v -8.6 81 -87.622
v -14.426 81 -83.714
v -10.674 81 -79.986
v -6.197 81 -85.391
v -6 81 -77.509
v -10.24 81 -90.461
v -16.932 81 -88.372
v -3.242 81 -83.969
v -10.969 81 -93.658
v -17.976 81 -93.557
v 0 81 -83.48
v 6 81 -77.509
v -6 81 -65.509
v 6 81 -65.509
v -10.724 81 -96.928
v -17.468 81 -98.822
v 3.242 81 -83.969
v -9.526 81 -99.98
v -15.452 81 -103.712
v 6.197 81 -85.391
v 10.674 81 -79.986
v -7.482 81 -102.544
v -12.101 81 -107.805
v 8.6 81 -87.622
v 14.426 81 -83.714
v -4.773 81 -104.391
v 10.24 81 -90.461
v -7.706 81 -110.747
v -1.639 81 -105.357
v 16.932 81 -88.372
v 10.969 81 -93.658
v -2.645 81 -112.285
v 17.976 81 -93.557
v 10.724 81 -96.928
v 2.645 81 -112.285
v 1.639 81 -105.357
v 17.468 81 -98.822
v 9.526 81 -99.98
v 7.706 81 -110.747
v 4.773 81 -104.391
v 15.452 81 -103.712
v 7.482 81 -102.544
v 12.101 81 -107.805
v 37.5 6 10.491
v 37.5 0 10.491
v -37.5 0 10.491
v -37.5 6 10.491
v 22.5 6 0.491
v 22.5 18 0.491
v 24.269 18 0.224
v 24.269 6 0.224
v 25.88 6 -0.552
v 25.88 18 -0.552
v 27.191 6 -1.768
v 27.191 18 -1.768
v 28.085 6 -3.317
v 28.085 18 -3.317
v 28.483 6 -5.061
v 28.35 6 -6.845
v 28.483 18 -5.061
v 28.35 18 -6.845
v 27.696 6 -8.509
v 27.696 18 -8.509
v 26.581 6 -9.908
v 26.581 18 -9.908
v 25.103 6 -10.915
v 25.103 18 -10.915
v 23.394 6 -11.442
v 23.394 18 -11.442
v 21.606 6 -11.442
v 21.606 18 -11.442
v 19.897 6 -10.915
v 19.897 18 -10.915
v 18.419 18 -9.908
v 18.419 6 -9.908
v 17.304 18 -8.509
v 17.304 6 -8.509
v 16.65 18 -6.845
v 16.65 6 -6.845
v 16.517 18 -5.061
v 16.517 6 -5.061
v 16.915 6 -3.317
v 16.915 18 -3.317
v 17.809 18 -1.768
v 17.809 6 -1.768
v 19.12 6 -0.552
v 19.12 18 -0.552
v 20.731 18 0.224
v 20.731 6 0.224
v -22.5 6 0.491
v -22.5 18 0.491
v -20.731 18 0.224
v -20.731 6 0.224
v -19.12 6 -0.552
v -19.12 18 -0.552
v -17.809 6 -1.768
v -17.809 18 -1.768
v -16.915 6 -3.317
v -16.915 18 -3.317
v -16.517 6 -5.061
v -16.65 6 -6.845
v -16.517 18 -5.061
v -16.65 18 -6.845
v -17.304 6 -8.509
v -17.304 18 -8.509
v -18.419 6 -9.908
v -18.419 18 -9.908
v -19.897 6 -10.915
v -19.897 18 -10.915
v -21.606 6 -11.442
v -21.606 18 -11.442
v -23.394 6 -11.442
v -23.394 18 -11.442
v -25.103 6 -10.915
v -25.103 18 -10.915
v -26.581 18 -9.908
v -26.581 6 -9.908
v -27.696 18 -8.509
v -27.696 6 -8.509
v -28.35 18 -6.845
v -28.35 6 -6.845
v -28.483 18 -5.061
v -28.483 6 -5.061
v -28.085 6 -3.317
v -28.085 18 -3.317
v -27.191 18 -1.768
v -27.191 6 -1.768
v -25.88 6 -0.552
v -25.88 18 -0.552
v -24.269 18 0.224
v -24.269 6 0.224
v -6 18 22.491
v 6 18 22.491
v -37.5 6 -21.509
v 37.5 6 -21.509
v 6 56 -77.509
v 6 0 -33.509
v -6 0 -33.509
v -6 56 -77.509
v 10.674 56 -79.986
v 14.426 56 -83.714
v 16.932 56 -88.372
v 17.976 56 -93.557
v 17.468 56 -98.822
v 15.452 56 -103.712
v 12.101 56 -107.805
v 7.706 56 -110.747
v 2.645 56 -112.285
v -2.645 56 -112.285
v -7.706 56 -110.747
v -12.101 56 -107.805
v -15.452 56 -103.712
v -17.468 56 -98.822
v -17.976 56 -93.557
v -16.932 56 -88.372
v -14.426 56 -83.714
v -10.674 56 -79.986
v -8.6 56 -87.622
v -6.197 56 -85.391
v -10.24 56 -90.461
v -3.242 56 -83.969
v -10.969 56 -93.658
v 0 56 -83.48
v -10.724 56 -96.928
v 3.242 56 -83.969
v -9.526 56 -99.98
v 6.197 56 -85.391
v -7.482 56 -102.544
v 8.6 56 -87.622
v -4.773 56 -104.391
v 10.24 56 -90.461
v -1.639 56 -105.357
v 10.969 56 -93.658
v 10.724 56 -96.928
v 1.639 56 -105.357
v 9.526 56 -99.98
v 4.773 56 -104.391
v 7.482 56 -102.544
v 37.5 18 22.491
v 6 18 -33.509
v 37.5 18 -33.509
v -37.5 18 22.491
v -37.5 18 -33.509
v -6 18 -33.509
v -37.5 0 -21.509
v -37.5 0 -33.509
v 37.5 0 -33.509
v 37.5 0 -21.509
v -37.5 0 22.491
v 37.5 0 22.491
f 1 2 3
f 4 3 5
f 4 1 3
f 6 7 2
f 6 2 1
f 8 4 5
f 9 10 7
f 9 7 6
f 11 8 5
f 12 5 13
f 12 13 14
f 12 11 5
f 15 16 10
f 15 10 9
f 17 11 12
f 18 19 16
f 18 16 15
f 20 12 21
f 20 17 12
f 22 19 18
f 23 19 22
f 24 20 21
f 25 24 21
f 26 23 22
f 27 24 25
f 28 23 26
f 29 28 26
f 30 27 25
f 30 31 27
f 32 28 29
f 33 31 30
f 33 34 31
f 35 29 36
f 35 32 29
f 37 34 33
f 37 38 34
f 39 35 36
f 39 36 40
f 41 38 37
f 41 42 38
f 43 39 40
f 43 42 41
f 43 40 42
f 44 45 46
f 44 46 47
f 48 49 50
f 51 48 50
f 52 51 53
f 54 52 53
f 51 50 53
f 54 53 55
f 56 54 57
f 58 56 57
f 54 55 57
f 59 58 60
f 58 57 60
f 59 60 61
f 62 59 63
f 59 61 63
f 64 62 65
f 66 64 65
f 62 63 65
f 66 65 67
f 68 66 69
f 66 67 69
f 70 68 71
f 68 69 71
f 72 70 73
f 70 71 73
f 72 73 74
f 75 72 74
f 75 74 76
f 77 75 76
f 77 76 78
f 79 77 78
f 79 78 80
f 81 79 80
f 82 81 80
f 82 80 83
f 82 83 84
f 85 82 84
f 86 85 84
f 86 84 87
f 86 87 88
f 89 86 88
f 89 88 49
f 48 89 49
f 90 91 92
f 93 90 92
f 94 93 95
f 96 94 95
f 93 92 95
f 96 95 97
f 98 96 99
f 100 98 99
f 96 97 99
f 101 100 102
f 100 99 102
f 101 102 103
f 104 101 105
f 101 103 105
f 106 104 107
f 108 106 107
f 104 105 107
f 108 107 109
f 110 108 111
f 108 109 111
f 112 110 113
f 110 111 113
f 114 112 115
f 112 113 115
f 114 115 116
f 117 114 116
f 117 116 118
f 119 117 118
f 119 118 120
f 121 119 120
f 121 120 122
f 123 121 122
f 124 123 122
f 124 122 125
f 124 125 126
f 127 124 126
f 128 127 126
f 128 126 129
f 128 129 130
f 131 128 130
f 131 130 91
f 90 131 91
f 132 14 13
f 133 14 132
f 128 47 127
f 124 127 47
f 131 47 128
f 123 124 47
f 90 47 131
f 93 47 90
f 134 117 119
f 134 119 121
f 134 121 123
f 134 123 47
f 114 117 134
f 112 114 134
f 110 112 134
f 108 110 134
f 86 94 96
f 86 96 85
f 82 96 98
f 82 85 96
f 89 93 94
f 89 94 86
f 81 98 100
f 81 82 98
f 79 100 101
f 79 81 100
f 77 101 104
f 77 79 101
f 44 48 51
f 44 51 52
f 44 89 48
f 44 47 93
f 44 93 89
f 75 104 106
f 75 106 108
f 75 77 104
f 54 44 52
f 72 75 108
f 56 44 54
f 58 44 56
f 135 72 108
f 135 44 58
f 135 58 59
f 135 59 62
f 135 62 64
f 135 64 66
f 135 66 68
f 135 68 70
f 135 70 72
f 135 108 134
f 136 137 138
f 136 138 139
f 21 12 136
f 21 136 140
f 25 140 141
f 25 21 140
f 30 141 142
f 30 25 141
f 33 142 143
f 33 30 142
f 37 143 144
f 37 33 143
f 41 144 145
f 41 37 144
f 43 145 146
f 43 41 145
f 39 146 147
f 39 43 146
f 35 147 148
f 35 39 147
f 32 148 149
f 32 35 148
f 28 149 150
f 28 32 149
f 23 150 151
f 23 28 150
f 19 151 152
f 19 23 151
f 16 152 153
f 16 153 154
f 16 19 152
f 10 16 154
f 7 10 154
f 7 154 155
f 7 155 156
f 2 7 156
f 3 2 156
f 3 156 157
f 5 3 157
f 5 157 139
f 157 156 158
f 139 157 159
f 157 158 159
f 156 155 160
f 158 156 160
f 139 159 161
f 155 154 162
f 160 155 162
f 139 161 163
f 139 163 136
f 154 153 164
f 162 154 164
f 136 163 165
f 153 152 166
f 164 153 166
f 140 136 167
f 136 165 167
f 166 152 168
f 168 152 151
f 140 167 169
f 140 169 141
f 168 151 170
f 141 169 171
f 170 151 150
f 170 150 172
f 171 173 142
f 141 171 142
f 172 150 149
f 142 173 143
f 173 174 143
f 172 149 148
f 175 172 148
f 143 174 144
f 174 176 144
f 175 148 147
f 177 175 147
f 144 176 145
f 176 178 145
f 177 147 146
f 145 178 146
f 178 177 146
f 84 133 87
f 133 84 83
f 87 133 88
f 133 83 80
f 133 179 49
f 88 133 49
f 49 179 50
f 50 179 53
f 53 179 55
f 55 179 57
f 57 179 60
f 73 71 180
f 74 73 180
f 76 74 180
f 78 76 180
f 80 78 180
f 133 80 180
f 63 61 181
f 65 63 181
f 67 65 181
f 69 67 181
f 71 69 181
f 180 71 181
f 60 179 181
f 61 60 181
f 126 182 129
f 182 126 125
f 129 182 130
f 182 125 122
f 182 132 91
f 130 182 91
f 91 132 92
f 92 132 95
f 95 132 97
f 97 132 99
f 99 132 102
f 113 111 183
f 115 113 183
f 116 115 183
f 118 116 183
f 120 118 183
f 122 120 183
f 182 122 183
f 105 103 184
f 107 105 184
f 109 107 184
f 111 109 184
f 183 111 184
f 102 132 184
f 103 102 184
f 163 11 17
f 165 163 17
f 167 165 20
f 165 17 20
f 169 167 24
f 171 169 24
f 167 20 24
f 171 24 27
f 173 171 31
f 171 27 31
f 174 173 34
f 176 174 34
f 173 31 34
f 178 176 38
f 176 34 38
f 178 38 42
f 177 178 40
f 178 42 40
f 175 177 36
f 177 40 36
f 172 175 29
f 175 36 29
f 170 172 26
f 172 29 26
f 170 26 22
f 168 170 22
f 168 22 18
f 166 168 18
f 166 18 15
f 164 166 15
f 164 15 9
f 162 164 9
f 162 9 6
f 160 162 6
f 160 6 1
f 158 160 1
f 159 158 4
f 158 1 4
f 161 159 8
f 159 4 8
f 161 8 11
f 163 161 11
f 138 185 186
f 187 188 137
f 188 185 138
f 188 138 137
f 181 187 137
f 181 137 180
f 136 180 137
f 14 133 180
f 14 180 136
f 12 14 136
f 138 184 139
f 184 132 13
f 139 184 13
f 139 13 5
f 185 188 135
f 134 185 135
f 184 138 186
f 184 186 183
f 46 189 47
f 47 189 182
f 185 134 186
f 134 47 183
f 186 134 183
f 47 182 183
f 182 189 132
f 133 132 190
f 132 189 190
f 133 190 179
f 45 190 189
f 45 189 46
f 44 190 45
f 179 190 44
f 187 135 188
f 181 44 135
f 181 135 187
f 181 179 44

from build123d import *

# Parameters (mm, degrees)
SKETCH1_W           = 56
SKETCH1_H           = 18
BOSS_EXTRUDE1_DEPTH = 75
SKETCH2_R           = 6
CUT_EXTRUDE1_DEPTH  = 75
SKETCH3_W           = 32
SKETCH3_H           = 6
CUT_EXTRUDE2_DEPTH  = 75
BOSS_EXTRUDE5_DEPTH = 6
SKETCH23_R          = 18
SKETCH23_R_2        = 11
BOSS_EXTRUDE7_DEPTH = 25


with BuildPart() as part:
    # Sketch1 → Boss-Extrude1 (new body)
    with BuildSketch(Plane(origin=(0, 0, 0), x_dir=(0, 0, -1), z_dir=(1, 0, 0))):
        with Locations((5.509433962, 9)):
            Rectangle(SKETCH1_W, SKETCH1_H)
    extrude(amount=-BOSS_EXTRUDE1_DEPTH)

    # Sketch2 → Cut-Extrude1 (cut)
    with BuildSketch(Plane(origin=(0, 18, 0), x_dir=(1, 0, 0), z_dir=(0, 1, 0))):
        with Locations(Location((-15, 5.509433962, 0), (0, 0, 270))):
            Circle(SKETCH2_R)
        with Locations(Location((-60, 5.509433962, 0), (0, 0, 270))):
            Circle(SKETCH2_R)
    extrude(amount=-CUT_EXTRUDE1_DEPTH, mode=Mode.SUBTRACT)

    # Sketch3 → Cut-Extrude2 (cut)
    with BuildSketch(Plane(origin=(0, 0, 0), x_dir=(0, 0, -1), z_dir=(1, 0, 0))):
        with Locations((5.509433962, 3)):
            Rectangle(SKETCH3_W, SKETCH3_H)
    extrude(amount=-CUT_EXTRUDE2_DEPTH, mode=Mode.SUBTRACT)


with BuildPart() as part_1:
    # Body-Move/Copy1: moved
    add(part.part.moved(Location((37.5, 0, 0))))

    # Sketch4 → Boss-Extrude5 (add, symmetric)
    with BuildSketch(Plane(origin=(0, 0, 0), x_dir=(0, 0, -1), z_dir=(1, 0, 0))):
        Polygon((65.509433962, 81), (-22.490566038, 18), (33.509433962, 18), (33.509433962, 0), (77.509433962, 56), (77.509433962, 81), align=None)
    extrude(amount=BOSS_EXTRUDE5_DEPTH, both=True)

    # Sketch23 → Boss-Extrude7 (add)
    with BuildSketch(Plane(origin=(0, 81, 0), x_dir=(1, 0, 0), z_dir=(0, 1, 0))):
        with Locations((0, 94.479996711)):
            Circle(SKETCH23_R)
        with Locations(Location((0, 94.479996711, 0), (0, 0, 270))):
            Circle(SKETCH23_R_2, mode=Mode.SUBTRACT)
    extrude(amount=-BOSS_EXTRUDE7_DEPTH)


solid = part_1.part
